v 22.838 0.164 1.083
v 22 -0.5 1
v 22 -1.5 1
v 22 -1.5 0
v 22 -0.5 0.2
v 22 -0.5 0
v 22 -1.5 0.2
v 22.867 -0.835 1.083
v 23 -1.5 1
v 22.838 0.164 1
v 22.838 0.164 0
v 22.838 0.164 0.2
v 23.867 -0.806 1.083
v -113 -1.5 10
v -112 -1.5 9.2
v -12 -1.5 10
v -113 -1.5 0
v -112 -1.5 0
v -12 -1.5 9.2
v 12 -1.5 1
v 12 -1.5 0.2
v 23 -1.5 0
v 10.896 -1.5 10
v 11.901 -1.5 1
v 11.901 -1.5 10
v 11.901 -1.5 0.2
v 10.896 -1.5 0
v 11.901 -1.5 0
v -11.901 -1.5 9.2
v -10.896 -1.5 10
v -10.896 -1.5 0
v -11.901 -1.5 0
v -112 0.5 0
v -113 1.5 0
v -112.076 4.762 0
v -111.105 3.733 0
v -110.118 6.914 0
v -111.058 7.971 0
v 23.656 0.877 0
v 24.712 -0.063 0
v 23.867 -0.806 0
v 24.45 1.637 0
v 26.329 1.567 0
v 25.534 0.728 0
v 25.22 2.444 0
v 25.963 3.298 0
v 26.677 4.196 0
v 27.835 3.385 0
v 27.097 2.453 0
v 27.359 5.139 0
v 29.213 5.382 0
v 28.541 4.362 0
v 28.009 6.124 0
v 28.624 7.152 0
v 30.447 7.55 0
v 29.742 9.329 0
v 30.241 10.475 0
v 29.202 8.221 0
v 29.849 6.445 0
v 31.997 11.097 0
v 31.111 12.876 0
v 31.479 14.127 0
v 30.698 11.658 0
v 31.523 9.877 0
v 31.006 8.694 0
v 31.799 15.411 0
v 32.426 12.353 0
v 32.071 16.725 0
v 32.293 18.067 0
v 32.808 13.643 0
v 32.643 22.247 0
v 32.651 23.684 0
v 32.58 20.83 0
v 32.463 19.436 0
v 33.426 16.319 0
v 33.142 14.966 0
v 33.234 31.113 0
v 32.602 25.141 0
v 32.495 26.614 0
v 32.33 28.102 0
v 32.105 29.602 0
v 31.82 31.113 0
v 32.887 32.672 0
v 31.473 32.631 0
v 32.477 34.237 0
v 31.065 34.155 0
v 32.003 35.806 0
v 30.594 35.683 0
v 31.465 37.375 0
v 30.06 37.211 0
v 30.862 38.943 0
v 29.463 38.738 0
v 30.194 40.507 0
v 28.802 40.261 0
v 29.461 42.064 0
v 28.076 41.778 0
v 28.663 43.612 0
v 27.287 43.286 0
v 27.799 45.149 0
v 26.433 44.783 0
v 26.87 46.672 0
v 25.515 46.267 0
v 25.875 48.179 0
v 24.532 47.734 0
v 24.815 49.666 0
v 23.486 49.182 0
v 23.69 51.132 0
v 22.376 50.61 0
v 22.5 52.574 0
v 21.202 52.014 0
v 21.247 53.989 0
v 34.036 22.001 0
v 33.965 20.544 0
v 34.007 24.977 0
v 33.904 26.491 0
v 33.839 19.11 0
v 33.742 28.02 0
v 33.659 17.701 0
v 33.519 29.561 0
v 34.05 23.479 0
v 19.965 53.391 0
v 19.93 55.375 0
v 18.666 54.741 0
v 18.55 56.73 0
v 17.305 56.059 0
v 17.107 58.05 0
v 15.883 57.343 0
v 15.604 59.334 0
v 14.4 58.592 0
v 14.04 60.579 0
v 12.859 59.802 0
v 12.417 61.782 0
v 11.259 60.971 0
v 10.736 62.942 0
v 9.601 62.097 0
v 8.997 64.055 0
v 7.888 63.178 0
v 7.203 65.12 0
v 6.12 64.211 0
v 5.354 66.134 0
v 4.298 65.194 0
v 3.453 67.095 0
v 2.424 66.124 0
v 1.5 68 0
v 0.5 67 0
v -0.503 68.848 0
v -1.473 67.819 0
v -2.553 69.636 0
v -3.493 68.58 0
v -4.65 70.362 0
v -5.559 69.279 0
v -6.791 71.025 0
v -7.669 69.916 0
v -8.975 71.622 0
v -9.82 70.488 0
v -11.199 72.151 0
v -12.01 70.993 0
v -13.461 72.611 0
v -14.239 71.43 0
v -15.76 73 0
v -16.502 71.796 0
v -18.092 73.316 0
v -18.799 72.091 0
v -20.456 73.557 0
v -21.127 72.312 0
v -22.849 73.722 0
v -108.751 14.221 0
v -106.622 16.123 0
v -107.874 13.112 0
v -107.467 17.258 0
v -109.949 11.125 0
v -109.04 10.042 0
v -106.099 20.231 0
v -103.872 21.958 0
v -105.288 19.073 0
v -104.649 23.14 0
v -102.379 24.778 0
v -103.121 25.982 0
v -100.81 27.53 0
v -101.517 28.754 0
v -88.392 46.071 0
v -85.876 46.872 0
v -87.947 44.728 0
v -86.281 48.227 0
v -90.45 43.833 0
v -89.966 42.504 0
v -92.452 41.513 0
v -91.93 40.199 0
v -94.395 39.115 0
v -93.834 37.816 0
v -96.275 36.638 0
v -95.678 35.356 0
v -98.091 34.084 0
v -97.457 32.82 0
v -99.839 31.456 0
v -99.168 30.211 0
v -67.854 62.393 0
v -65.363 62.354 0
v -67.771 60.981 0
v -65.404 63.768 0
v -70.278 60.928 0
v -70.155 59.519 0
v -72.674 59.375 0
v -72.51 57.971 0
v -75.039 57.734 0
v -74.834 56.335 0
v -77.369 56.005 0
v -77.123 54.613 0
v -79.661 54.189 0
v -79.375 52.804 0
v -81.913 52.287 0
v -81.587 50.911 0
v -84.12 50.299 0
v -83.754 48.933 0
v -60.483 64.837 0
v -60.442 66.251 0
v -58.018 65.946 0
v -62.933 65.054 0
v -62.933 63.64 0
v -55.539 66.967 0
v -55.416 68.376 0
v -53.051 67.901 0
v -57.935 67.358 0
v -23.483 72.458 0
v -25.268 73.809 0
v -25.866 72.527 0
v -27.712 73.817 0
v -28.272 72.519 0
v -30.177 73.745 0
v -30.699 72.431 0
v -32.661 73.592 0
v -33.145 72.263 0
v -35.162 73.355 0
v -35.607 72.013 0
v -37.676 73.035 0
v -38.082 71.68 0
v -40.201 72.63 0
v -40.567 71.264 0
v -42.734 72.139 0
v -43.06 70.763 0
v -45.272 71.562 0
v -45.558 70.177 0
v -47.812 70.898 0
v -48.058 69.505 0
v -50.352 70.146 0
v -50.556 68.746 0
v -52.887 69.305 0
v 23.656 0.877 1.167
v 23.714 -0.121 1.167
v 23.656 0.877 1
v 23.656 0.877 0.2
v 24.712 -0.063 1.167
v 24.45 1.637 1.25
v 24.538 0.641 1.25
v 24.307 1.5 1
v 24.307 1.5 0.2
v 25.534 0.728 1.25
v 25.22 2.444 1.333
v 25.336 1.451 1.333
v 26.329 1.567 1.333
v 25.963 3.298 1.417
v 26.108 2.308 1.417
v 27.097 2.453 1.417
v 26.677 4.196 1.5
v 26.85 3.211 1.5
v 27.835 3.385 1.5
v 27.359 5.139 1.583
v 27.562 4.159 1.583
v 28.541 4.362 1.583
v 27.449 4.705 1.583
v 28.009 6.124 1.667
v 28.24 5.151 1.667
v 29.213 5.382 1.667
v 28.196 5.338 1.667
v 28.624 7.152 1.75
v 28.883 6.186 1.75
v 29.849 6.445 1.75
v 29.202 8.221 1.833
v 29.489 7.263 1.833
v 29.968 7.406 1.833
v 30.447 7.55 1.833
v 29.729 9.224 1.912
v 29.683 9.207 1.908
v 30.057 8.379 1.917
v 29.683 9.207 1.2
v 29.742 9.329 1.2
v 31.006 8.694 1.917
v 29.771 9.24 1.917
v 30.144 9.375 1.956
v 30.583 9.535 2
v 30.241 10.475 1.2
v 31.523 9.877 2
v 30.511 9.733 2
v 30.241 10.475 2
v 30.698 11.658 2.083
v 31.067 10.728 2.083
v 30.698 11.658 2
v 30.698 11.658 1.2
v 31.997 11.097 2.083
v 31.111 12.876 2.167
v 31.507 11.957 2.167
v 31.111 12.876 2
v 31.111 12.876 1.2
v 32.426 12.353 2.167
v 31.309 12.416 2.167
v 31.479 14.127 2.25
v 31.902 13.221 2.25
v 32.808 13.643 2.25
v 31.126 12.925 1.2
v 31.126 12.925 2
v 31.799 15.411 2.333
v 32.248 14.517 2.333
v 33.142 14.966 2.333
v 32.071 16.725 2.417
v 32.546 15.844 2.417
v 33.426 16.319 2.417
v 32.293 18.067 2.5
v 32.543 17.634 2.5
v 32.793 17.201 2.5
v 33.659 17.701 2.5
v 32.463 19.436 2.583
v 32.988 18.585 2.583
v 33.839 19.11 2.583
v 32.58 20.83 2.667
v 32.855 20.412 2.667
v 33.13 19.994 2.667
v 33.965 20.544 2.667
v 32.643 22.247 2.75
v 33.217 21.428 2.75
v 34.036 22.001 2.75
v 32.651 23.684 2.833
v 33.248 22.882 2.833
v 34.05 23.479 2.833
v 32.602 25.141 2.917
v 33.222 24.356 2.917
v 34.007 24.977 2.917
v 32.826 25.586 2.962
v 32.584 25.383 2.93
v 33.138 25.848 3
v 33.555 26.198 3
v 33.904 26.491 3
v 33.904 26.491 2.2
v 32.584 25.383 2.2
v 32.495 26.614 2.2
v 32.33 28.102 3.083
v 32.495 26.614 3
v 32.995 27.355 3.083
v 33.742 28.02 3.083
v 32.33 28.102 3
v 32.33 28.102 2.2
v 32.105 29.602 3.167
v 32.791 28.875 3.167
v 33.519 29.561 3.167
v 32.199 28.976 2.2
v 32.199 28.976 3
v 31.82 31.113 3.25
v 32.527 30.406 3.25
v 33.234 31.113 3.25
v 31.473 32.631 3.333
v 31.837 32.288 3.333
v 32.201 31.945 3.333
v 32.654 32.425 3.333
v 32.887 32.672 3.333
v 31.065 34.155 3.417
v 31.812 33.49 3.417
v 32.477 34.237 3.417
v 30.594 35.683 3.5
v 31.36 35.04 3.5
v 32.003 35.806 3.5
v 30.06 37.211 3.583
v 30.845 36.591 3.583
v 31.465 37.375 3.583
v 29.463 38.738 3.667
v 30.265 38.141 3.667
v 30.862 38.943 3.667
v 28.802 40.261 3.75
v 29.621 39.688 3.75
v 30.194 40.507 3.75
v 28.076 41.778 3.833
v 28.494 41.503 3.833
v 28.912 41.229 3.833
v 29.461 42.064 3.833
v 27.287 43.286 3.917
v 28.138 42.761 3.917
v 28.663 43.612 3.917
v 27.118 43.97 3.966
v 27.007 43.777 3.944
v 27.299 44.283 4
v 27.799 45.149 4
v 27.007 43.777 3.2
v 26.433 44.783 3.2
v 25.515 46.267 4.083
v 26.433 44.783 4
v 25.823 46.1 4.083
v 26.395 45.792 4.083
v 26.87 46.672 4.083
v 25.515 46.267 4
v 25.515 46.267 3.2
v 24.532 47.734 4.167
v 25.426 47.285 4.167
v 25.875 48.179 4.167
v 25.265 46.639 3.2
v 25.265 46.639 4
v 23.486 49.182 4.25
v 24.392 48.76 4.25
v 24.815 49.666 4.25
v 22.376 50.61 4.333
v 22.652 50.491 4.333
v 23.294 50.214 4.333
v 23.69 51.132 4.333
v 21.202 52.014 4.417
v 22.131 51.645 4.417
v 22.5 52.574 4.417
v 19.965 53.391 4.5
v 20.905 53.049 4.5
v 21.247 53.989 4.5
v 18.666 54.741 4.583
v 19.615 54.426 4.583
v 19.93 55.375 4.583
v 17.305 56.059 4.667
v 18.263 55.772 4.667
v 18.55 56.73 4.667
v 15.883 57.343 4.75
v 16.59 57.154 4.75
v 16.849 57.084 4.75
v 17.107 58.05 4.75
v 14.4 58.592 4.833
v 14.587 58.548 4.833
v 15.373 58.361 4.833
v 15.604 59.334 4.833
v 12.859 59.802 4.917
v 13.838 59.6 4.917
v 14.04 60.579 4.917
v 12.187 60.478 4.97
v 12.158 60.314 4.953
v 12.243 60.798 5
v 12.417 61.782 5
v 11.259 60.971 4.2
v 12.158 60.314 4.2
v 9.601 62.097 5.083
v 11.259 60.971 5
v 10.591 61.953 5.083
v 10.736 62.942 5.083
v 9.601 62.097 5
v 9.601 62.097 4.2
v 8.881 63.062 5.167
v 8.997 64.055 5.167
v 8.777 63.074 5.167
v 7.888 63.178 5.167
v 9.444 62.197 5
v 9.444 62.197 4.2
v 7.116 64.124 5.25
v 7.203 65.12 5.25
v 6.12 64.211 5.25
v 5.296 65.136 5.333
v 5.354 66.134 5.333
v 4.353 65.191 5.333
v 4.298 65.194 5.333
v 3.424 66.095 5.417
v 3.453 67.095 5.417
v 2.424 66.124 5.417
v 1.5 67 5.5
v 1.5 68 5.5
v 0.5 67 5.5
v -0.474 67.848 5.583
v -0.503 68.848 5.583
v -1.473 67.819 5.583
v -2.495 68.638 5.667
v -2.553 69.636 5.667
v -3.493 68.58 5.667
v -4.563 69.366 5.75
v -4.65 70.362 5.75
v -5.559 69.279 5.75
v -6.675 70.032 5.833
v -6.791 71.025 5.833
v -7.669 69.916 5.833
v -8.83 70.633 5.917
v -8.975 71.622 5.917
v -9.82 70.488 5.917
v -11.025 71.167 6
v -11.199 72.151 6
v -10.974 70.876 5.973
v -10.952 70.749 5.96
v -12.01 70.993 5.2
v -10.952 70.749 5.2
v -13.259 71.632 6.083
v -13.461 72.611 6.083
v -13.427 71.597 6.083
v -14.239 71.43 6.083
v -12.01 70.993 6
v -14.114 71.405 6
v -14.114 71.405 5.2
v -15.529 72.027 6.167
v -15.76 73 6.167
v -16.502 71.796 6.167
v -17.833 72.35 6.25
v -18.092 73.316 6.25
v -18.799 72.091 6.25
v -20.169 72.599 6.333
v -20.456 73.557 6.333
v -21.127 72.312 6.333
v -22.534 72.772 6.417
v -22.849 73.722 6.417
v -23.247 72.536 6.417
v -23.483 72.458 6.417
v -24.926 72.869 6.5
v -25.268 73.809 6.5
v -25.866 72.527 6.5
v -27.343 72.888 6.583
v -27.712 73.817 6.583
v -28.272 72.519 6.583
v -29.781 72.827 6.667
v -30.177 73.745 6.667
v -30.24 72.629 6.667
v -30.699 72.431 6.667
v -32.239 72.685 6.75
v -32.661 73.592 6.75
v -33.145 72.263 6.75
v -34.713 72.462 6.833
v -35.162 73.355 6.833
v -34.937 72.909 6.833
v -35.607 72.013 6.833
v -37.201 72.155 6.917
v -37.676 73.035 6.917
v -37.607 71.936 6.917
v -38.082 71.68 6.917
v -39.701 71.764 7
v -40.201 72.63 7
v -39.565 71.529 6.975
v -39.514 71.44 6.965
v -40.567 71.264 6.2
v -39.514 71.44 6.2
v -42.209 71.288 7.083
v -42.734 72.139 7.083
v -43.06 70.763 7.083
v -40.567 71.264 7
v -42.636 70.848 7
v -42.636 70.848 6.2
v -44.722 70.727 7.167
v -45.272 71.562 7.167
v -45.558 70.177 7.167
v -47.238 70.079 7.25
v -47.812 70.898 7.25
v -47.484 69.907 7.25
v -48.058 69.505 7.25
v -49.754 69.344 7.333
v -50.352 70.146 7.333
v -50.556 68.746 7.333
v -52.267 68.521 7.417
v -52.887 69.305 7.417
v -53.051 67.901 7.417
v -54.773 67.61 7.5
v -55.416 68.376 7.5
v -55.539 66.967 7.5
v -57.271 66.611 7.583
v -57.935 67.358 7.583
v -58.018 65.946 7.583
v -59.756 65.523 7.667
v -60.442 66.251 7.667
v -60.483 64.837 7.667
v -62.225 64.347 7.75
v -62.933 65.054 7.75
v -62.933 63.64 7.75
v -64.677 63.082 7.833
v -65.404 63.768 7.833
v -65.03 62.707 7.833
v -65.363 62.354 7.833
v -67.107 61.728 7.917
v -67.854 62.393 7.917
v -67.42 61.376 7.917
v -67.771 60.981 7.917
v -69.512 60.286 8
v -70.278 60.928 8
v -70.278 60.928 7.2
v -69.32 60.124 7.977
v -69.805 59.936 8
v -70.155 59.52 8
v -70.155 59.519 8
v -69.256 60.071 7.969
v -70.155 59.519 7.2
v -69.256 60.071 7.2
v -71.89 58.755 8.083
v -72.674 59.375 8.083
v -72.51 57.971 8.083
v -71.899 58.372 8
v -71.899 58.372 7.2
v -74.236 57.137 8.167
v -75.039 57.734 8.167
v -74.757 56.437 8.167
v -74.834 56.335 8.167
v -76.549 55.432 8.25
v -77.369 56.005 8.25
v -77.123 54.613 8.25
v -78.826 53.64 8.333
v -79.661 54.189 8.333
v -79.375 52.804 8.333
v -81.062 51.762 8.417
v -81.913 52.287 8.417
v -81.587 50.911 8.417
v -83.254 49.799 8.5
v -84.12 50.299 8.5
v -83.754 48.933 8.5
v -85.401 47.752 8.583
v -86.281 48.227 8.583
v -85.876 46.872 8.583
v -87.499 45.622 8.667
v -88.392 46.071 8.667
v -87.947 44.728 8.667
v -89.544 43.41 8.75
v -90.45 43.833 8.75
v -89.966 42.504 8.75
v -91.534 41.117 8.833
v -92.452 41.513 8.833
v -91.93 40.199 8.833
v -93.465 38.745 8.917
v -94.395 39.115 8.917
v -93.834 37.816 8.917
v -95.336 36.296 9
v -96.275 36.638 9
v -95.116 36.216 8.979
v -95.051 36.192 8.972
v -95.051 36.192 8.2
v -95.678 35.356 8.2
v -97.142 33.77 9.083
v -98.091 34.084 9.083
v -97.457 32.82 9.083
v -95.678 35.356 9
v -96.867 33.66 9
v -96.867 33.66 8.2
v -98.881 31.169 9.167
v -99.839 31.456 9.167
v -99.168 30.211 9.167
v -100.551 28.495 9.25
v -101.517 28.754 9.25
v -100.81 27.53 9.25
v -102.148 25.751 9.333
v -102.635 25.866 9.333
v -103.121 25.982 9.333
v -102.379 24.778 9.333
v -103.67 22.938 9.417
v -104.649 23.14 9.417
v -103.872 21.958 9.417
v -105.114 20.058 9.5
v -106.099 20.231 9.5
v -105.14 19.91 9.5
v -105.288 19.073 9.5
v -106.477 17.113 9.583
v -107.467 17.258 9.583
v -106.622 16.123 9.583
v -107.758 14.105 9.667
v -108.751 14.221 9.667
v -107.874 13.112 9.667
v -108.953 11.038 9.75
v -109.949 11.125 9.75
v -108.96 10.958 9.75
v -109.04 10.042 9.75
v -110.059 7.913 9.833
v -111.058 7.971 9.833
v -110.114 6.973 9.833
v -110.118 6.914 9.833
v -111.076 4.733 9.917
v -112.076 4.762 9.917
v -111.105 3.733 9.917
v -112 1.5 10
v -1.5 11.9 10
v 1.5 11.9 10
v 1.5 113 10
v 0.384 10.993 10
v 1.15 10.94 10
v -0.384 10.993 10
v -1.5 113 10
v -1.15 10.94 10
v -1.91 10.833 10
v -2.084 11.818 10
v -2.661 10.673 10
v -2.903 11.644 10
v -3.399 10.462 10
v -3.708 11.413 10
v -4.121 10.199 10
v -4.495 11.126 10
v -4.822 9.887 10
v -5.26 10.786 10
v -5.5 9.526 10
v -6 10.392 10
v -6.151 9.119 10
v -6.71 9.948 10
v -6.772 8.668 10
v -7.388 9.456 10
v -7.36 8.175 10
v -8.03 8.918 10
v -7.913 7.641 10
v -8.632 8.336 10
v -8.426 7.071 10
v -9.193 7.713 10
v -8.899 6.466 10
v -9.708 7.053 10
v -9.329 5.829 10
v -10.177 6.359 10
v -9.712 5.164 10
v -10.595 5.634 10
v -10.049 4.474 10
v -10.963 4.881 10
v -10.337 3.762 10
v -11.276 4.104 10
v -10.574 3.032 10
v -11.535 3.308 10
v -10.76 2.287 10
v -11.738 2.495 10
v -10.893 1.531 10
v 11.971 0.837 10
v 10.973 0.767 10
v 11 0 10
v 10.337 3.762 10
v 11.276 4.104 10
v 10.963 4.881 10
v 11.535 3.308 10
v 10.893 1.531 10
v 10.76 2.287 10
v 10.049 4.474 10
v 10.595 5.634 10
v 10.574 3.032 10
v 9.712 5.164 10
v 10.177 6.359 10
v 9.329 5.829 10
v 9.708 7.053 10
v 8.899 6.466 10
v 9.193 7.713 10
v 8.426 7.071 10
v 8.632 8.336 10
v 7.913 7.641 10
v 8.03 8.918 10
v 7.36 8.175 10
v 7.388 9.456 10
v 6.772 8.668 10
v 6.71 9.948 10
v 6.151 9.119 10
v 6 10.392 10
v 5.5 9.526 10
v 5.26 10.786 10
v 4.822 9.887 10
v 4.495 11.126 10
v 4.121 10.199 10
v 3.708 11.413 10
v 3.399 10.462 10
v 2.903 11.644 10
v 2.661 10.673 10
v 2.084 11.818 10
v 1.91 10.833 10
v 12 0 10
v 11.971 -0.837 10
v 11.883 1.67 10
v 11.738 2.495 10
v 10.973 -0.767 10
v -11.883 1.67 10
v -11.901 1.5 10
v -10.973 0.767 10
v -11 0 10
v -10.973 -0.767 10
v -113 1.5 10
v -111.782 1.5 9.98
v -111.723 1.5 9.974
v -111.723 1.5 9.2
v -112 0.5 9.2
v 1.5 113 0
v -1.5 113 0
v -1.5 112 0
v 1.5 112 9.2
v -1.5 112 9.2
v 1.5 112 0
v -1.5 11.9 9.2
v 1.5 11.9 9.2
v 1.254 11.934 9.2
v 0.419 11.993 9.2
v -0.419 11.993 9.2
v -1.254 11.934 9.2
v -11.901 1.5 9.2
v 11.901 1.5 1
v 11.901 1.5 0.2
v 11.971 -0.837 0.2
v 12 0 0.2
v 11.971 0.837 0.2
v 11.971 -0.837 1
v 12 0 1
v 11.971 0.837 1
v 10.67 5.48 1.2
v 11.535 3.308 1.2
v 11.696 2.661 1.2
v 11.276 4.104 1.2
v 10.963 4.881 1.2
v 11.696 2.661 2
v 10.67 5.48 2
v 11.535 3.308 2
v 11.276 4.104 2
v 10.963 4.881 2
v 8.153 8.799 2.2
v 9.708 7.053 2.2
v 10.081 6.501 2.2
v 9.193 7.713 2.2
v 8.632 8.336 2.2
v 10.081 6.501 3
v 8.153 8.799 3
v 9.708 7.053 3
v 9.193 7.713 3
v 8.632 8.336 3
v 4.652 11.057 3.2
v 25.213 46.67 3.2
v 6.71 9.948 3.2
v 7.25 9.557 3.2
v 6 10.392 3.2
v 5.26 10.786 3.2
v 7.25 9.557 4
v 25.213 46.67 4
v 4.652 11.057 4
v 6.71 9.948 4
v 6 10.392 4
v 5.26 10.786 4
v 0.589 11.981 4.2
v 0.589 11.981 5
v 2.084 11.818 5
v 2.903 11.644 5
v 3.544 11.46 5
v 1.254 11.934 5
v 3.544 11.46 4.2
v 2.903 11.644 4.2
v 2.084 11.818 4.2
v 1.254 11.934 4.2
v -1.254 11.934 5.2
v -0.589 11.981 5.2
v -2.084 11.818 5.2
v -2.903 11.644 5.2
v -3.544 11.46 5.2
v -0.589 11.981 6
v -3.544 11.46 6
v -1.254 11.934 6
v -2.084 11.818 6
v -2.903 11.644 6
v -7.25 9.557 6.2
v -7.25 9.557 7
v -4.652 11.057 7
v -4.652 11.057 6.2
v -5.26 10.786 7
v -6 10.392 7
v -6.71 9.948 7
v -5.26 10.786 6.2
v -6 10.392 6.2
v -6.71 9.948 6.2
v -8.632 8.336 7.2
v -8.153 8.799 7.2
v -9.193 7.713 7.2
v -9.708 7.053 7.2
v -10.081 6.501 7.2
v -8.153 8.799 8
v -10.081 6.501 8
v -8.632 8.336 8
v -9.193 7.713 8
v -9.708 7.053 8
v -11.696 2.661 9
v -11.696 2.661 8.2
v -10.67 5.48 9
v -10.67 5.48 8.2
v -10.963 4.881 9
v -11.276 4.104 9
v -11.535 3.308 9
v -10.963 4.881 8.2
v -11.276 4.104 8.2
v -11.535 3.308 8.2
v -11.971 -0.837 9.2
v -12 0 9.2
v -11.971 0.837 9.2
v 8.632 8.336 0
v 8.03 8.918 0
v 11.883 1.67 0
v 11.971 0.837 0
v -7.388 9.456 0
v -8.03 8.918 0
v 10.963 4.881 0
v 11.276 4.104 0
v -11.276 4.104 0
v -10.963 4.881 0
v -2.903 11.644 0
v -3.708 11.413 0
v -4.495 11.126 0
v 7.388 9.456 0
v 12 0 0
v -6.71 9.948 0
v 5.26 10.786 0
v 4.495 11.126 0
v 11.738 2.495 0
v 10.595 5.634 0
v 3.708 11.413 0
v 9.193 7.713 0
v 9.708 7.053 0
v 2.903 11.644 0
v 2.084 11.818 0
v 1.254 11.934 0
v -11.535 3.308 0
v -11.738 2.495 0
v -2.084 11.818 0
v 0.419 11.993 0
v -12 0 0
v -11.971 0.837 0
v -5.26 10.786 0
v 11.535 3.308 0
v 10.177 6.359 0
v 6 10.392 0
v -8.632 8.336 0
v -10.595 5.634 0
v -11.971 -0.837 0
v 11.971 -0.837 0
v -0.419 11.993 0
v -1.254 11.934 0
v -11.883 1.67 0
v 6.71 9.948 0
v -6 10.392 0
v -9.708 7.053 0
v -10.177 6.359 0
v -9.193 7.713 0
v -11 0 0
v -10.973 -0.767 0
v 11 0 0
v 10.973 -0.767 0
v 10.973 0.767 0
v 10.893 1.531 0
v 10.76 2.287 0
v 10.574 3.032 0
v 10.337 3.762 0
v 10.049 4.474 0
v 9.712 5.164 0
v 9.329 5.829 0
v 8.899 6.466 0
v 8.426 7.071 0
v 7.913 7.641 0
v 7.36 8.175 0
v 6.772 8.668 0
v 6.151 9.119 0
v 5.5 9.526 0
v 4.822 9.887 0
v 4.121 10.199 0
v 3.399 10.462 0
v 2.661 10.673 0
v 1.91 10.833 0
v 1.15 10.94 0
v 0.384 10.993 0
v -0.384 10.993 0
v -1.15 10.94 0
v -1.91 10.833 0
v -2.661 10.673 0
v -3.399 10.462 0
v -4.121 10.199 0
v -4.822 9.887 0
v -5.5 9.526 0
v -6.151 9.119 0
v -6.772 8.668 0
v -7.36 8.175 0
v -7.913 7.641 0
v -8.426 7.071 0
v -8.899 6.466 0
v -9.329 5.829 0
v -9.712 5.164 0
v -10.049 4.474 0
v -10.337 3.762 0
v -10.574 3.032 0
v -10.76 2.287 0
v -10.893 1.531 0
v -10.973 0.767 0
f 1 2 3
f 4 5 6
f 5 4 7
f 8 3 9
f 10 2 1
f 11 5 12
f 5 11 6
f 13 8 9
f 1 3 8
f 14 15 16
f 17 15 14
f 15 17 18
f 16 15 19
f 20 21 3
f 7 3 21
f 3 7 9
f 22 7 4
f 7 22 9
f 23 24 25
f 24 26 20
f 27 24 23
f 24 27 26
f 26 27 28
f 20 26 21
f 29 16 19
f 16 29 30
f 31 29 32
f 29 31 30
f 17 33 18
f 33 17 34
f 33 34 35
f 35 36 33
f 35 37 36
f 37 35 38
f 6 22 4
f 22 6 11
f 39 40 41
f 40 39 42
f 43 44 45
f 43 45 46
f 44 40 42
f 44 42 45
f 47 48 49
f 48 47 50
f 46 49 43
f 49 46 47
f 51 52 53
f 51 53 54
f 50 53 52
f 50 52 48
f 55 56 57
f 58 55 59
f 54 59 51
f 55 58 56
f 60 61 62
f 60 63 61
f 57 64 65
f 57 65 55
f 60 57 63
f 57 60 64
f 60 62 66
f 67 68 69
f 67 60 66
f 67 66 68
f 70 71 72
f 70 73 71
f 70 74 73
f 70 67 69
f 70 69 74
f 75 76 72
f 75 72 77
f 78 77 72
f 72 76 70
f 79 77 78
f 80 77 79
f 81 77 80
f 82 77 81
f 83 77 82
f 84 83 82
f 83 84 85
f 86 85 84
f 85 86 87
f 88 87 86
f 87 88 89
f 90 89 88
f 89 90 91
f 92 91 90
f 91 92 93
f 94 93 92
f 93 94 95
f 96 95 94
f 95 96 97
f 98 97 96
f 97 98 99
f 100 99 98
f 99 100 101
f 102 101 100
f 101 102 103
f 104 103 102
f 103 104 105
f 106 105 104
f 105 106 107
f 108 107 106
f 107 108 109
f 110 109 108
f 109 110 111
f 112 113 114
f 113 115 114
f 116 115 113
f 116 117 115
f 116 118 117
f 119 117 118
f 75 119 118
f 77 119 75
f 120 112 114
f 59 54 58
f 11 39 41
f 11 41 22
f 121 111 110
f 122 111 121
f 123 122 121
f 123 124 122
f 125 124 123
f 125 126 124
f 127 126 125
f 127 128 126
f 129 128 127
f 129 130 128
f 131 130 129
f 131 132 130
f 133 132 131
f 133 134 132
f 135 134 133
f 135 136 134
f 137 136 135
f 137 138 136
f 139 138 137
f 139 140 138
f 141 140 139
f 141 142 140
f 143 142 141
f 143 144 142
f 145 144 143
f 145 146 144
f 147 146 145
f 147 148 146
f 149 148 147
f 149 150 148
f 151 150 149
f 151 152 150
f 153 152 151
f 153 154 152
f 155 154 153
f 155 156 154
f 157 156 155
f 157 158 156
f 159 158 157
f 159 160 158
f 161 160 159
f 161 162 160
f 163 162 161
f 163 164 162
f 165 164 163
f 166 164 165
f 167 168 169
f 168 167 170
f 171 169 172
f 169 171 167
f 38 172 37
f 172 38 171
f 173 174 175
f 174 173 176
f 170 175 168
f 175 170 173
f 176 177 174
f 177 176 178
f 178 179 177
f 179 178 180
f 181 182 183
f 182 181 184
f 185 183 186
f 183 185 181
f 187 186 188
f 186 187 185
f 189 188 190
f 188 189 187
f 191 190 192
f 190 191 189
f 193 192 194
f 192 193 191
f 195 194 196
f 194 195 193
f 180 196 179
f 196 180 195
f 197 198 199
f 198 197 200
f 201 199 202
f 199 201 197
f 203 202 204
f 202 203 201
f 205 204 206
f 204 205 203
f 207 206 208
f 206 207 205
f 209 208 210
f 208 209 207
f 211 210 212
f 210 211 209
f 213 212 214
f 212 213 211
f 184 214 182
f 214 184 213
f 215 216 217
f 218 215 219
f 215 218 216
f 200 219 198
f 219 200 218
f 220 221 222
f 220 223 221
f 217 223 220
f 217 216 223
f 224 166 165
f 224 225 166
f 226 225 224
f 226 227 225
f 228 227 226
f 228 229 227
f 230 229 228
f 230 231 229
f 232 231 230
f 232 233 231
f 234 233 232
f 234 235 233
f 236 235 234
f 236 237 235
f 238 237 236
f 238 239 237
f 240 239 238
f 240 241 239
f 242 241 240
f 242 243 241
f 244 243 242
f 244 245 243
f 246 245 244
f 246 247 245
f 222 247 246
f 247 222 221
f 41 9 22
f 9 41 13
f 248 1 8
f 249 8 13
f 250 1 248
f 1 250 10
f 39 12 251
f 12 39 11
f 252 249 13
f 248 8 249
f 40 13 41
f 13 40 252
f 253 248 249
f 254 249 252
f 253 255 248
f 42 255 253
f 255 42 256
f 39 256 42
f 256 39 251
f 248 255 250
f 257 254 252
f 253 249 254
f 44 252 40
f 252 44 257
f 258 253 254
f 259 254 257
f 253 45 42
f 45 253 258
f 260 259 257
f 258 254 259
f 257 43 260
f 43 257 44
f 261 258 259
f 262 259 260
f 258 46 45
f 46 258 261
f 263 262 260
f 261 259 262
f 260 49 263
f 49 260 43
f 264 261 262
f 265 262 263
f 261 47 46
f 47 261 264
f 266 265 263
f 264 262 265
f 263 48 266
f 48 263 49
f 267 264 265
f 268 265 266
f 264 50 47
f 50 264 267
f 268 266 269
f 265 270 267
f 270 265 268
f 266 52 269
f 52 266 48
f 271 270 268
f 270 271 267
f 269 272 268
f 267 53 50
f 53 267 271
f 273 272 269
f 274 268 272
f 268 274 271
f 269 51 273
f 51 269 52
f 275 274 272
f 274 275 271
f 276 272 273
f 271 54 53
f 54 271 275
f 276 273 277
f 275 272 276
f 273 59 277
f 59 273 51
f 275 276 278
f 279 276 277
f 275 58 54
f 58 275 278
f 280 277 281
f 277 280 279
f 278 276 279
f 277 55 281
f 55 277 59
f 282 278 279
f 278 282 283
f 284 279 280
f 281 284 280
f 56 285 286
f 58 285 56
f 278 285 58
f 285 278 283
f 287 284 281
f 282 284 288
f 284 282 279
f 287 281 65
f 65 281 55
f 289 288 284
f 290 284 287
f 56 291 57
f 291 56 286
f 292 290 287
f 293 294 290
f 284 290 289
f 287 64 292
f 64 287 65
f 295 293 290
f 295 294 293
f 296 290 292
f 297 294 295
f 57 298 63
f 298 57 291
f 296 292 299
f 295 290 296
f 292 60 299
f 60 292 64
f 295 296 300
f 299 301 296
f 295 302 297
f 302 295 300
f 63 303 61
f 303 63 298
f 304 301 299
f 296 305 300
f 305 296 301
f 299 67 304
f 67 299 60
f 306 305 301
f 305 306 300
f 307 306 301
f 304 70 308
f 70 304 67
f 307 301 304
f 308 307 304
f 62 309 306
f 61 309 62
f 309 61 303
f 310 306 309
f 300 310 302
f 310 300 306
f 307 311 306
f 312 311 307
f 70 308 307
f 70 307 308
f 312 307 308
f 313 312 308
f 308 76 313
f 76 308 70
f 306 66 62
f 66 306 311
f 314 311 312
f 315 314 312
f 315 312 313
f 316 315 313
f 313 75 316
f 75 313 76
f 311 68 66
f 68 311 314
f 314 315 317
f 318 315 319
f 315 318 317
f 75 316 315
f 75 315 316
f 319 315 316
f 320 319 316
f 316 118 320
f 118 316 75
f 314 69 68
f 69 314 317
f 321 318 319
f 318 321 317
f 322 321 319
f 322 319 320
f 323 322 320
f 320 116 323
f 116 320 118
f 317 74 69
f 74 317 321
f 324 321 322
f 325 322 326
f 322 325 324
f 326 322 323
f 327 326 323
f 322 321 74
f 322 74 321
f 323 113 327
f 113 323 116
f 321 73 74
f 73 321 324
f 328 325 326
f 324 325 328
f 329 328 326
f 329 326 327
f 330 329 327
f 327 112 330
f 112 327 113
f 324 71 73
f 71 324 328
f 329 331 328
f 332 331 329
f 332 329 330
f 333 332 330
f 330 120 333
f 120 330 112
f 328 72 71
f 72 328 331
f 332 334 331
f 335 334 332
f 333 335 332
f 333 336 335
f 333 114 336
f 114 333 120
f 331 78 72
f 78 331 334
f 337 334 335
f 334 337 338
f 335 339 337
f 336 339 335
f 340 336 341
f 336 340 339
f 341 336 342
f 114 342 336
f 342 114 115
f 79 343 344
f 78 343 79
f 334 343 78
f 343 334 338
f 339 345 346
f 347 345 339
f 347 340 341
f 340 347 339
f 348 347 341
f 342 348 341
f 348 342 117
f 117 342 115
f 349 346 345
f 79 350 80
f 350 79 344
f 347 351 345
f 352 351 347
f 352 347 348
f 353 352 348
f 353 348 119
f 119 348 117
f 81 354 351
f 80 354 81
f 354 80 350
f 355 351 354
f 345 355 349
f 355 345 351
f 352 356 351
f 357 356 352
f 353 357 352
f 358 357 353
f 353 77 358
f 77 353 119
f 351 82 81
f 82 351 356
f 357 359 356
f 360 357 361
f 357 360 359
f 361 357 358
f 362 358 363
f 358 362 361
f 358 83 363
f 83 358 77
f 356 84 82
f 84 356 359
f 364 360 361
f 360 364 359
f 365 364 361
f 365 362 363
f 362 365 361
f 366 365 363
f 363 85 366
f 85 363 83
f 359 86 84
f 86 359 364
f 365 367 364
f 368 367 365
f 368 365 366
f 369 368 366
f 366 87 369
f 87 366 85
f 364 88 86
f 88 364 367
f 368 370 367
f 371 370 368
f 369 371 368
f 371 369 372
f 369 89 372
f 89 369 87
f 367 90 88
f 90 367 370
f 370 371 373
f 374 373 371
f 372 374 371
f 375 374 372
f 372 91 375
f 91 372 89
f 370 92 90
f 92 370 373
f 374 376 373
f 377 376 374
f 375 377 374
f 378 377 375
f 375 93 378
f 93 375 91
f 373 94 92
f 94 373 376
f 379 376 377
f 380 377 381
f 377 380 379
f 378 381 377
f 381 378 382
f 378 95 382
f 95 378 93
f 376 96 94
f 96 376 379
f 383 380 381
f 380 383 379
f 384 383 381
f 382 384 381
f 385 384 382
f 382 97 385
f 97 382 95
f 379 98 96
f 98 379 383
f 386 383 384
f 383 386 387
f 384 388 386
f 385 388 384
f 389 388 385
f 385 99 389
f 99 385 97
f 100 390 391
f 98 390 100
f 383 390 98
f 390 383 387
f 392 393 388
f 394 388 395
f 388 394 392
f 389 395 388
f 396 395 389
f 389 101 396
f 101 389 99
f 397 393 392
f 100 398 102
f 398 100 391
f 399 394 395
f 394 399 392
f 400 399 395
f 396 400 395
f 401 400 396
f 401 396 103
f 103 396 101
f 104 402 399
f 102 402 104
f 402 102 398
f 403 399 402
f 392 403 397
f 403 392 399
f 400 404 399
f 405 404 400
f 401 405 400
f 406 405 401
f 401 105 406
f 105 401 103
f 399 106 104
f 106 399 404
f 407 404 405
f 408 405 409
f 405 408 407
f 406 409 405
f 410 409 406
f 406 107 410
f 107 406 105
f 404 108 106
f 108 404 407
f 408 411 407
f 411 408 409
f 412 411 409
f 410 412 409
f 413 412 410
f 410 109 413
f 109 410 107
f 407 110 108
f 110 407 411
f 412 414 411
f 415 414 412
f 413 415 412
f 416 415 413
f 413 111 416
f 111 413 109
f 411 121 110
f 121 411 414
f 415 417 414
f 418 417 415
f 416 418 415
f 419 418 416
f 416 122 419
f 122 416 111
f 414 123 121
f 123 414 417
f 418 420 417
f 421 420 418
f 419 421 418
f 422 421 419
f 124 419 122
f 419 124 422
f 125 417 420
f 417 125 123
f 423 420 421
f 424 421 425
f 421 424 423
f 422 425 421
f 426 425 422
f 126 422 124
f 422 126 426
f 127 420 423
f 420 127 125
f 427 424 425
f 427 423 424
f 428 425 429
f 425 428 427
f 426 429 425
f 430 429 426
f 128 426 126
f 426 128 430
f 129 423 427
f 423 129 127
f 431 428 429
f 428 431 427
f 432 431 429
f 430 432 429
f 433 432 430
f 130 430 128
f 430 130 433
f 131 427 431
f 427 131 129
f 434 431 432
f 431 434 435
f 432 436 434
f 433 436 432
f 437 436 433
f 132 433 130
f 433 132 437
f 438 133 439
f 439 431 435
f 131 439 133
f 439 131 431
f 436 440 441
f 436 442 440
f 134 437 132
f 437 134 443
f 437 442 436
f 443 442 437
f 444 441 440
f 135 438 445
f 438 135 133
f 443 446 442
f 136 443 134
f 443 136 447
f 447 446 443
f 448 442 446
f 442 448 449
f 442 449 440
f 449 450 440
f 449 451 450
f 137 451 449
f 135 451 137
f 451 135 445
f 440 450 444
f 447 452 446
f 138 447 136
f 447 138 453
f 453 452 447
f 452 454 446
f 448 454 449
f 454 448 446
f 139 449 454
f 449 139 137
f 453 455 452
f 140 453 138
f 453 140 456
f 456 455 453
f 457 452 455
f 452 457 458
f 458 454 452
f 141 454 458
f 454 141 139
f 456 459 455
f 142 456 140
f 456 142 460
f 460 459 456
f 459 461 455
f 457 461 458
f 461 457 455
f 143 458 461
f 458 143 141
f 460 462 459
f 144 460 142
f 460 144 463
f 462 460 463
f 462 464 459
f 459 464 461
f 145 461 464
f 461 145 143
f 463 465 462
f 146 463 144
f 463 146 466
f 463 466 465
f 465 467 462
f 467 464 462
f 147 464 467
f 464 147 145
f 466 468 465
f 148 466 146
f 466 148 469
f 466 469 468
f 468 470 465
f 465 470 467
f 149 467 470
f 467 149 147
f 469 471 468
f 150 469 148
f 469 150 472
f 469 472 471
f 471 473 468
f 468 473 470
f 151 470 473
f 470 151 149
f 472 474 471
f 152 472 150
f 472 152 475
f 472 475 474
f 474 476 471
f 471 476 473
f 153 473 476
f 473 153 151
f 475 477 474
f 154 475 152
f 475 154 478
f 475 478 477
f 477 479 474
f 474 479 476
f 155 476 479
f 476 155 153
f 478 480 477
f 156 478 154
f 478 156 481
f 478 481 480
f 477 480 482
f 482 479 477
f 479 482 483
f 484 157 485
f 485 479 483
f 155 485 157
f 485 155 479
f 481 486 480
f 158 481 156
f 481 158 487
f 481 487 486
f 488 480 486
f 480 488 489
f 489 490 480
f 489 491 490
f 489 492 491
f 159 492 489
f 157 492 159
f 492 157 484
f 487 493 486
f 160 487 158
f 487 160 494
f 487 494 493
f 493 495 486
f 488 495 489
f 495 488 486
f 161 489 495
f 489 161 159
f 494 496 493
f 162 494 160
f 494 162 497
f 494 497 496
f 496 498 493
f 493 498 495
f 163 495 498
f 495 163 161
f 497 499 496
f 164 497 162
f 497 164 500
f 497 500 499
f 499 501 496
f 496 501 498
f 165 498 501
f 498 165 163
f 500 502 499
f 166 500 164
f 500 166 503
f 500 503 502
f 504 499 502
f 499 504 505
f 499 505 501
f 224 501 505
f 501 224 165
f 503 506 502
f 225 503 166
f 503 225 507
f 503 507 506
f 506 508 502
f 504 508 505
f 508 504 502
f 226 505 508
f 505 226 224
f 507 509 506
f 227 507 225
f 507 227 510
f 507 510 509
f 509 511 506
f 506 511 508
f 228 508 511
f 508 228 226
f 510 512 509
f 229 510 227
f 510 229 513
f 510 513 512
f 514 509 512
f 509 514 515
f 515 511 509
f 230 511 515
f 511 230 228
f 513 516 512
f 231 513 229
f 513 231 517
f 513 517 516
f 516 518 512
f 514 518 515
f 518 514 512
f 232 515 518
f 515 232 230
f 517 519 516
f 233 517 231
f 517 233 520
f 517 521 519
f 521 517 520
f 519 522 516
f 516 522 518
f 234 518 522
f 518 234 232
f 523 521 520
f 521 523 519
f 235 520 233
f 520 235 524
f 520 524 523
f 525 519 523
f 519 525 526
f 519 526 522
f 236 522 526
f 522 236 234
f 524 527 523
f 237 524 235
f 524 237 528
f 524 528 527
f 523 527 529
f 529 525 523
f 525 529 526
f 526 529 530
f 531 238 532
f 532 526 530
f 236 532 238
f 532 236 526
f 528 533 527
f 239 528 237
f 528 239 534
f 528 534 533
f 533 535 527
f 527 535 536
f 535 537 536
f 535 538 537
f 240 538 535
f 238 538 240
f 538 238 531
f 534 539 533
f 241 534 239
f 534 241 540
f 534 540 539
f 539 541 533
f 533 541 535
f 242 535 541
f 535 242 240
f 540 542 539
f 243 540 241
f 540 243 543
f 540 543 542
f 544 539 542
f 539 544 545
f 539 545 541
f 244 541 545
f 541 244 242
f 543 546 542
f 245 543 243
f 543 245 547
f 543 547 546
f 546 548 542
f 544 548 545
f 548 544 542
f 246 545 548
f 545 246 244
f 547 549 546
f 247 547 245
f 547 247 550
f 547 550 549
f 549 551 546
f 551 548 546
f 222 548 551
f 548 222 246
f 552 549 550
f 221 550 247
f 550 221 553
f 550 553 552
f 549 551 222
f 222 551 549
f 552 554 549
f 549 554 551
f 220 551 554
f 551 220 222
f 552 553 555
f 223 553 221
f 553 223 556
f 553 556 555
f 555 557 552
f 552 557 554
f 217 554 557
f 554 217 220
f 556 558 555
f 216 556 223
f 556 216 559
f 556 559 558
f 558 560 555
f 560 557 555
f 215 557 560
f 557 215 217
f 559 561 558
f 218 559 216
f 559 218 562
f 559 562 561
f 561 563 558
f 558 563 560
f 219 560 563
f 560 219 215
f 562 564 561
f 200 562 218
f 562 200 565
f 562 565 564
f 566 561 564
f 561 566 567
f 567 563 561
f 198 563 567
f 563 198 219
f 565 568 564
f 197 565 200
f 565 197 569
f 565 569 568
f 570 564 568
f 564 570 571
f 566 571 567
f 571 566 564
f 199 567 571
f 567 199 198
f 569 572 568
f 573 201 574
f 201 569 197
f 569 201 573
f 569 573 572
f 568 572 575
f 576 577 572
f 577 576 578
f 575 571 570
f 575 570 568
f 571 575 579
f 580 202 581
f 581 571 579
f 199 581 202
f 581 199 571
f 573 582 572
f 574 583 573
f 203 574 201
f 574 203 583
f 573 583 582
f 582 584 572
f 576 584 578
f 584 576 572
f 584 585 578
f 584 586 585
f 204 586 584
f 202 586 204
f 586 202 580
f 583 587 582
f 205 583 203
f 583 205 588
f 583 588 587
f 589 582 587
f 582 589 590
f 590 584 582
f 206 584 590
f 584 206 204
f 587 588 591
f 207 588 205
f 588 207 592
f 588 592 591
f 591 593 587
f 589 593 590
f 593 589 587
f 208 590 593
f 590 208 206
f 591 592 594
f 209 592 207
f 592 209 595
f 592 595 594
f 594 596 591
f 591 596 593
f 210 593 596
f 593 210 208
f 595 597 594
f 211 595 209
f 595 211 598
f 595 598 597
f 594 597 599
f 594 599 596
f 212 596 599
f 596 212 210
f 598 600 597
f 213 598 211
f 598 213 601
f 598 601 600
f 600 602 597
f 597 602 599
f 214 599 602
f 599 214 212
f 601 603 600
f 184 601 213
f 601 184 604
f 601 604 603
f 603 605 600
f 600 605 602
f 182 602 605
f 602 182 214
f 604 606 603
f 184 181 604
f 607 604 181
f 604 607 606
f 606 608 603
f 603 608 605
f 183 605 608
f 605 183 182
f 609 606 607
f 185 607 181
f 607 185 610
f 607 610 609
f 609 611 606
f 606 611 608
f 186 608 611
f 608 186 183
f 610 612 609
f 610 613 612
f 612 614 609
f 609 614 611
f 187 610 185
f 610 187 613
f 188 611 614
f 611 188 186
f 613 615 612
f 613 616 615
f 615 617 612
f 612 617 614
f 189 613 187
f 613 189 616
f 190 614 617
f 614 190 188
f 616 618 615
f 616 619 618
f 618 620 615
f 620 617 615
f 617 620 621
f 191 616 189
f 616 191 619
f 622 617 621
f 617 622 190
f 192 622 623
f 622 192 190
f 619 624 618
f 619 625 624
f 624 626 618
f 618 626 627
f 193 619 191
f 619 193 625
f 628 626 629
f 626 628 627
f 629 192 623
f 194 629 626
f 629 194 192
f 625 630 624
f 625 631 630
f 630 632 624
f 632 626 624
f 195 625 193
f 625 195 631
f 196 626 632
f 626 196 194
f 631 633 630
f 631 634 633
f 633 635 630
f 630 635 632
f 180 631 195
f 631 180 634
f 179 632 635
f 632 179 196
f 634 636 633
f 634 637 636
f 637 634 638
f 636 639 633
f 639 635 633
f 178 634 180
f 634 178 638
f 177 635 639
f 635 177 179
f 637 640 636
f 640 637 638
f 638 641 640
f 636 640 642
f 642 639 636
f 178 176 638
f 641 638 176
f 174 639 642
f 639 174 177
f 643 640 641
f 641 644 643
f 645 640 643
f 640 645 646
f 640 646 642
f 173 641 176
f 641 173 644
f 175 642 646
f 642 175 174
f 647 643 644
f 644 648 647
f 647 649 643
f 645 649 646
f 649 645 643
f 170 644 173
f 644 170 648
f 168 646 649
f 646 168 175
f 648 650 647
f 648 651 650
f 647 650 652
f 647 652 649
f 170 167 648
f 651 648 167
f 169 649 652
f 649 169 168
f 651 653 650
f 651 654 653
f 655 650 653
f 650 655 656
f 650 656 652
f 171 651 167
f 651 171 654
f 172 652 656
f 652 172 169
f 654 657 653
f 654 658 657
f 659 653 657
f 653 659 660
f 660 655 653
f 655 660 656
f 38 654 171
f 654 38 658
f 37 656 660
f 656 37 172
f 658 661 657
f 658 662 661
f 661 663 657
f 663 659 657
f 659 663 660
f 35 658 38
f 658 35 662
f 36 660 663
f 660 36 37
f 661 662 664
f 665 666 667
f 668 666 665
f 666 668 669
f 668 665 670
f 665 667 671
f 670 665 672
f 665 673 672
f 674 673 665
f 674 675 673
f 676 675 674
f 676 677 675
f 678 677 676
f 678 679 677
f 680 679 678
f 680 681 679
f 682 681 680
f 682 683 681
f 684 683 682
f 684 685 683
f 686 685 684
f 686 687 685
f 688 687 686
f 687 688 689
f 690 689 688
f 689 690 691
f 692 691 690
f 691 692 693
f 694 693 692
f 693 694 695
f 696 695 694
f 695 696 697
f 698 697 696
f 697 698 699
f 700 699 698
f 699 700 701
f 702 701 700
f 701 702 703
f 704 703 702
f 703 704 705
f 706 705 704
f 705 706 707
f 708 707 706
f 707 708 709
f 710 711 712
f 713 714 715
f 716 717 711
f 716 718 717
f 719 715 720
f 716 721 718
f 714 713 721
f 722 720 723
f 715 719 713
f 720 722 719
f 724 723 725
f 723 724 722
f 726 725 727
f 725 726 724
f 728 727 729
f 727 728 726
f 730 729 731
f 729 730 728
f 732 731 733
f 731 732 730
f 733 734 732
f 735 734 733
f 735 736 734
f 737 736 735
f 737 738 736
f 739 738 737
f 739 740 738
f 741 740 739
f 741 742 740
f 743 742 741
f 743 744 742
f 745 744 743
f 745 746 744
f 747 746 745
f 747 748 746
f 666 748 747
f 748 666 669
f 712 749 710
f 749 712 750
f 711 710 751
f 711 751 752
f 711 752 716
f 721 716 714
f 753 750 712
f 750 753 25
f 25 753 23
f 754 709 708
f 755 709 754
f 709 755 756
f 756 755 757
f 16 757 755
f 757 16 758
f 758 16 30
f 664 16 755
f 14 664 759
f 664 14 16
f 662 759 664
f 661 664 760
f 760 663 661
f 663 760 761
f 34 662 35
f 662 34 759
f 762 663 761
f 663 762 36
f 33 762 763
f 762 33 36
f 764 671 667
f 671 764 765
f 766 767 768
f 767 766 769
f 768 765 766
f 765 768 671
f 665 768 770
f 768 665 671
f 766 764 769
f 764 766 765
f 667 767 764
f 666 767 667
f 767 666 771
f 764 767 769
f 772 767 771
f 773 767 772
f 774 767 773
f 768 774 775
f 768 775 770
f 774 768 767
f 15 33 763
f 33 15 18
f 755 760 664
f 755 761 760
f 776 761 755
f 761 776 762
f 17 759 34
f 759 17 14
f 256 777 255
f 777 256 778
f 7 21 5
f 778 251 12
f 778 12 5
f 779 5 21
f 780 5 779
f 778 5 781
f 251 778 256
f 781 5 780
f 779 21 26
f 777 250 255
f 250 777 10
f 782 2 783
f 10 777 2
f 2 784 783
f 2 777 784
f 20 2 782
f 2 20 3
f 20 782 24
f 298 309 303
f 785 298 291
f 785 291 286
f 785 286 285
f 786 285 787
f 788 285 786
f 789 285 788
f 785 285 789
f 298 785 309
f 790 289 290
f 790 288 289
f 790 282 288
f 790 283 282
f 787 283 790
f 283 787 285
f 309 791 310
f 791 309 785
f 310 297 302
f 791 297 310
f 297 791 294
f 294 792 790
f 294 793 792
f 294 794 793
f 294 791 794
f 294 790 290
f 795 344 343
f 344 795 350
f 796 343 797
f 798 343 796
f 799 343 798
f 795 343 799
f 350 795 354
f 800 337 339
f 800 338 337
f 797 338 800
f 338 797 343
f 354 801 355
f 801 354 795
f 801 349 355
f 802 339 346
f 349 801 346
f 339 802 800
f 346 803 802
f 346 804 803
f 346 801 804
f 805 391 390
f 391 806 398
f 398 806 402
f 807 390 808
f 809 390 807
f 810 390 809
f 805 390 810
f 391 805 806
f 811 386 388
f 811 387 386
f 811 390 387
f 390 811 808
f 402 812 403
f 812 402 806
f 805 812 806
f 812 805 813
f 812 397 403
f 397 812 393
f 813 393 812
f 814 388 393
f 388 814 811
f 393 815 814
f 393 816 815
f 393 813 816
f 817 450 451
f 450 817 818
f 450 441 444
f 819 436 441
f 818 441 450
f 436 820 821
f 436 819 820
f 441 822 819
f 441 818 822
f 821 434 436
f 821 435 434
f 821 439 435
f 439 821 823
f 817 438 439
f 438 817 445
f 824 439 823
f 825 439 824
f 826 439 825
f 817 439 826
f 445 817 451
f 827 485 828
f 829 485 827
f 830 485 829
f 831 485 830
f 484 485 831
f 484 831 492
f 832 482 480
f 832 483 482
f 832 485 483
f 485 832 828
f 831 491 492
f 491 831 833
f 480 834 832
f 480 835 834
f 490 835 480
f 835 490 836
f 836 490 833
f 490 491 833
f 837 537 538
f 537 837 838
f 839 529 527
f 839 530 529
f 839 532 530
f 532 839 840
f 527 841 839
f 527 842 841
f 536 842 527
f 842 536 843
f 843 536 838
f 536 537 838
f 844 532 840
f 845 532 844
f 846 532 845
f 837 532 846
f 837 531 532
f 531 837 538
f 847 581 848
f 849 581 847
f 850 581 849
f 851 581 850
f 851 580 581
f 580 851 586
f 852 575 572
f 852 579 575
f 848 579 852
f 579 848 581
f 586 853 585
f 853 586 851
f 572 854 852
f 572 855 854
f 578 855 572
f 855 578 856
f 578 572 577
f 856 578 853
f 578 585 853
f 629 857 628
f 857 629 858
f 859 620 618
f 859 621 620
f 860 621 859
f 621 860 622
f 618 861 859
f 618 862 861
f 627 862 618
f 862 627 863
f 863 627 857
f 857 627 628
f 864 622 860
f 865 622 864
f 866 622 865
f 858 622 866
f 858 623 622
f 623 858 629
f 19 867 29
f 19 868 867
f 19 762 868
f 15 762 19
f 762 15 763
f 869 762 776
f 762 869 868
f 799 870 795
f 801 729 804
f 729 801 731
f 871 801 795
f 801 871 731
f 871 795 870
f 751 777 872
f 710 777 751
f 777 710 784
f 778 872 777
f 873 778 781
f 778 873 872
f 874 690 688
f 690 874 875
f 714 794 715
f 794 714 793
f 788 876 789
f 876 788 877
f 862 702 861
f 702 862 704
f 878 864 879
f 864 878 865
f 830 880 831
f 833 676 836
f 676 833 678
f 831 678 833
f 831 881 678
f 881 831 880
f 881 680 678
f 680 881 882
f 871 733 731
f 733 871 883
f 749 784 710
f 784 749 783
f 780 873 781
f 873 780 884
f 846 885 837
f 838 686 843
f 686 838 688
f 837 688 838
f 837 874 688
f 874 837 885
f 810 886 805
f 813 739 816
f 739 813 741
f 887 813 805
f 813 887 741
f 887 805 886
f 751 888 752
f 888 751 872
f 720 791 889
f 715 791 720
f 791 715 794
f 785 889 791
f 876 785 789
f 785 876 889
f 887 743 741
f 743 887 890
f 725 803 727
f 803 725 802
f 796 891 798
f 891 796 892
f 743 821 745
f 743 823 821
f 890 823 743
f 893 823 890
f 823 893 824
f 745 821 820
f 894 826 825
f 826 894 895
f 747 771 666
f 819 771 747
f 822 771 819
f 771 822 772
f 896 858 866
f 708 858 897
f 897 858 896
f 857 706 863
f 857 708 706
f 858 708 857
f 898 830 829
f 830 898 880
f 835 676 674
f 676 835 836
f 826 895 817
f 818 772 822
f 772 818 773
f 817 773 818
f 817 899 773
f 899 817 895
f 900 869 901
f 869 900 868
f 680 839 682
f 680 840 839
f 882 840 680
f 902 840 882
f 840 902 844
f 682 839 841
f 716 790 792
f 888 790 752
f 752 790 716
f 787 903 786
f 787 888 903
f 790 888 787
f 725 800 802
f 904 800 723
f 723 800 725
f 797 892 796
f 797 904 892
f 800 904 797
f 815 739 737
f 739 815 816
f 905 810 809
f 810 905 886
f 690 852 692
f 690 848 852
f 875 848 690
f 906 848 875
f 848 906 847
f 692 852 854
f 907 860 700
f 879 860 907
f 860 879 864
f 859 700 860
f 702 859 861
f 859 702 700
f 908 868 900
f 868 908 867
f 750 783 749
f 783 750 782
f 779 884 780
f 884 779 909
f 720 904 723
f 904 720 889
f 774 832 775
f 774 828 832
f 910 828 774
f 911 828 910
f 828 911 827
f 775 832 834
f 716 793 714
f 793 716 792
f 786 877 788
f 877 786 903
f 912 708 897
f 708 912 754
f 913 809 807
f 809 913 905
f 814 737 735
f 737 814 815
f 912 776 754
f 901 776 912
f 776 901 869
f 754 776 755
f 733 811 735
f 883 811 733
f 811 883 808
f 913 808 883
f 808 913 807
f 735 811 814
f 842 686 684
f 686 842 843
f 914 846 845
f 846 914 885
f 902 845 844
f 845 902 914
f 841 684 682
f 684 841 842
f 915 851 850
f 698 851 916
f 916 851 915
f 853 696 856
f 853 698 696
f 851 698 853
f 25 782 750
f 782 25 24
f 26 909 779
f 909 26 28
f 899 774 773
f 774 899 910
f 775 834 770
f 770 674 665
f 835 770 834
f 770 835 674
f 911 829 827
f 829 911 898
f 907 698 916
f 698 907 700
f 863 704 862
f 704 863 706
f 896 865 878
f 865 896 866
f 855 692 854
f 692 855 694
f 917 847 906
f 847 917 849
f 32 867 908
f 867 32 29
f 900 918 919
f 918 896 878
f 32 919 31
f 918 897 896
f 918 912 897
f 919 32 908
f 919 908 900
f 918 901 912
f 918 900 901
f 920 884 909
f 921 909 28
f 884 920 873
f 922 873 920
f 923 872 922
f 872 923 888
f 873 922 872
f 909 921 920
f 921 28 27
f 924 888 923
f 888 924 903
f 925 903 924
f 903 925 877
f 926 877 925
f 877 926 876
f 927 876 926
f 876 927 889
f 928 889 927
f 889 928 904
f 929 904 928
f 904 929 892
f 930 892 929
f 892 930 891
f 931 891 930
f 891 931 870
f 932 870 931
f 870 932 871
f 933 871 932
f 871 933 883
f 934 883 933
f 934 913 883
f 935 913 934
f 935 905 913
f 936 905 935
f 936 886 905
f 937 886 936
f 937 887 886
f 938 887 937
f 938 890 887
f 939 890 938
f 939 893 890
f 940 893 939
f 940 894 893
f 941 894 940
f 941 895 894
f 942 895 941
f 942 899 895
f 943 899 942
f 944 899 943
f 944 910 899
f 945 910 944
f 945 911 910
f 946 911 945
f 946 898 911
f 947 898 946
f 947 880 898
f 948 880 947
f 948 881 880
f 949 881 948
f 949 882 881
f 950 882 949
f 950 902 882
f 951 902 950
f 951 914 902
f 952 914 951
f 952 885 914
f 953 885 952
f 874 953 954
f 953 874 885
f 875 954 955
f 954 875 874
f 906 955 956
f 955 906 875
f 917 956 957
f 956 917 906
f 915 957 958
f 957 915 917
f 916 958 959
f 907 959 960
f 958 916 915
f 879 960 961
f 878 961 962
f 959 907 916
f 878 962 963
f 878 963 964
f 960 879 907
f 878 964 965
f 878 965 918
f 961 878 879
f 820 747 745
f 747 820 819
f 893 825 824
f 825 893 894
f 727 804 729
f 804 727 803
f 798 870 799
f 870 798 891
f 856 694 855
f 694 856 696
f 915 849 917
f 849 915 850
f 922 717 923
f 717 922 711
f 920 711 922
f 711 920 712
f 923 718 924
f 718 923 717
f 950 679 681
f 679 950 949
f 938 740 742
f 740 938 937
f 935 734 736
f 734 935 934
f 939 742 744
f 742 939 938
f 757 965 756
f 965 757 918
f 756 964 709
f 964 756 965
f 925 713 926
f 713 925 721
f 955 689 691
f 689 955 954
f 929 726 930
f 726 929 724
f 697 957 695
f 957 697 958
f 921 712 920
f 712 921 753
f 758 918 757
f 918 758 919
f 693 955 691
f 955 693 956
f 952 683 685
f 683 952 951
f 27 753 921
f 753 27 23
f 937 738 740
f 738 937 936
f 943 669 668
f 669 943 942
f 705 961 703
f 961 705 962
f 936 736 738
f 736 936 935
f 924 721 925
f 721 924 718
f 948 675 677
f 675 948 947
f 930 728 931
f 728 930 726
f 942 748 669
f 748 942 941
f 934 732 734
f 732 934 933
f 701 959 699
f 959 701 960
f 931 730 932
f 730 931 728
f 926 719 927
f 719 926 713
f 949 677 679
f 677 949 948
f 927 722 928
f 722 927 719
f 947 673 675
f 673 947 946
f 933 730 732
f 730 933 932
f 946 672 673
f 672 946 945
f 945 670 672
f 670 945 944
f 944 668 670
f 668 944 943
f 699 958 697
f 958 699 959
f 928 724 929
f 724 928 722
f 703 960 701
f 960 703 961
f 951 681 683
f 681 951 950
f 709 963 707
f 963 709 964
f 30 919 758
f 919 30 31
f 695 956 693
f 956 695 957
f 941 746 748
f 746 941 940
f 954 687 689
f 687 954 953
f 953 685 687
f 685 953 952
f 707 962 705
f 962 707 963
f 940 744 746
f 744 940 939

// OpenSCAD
// OpenSCAD  test object for bridges
// Also tests for on-extruder fan cooling unevenness in X,Y axes.

// Parametrised to use as much space on a print bed as required.
// this design uses only half the spiral of the original.

// Customiser enabled

// preview[view:north east, tilt:top diagonal]

/*[Bridges]*/
// length of the shortest bridge
min_bridge_length = 10; //[10:5:180]

// length of the longest bridge
max_bridge_length = 100; //[20:5:200]

// Total number
number_of_bridges = 10; //[4:1:20]

// difference between subsequent bridges
bridge_increment = (max_bridge_length - min_bridge_length) / (number_of_bridges - 1) ; //5;

// Test the XY cooling efficiency
show_XY_test = "yes"; // [yes,no]

/*[Shape]*/
// diameter of the central hub
hub_diameter = 24; //[18:1:30]

// width of each bridge
bridge_width = 3; //[1:1:8]

// thickness of the vertical walls
wall_thickness = 1; //[1:10]

// layer height of each bridge
bridge_height = 0.8; //[0.1:0.1:2]

// height of each bridge above the previous bridge
bridge_z_gap = 0.2; //[0.2:0.1:1]

/* [Hidden] */
// angle between each bridge
bridge_angle = 180.0 / (number_of_bridges -1);

spiralResolution = 12*1;
spiralIncrement = 1/spiralResolution;
maxAngle = bridge_angle * (number_of_bridges-1);
eps = 0.1 * 1; 
$fn = 90 * 1;


function spiralOffset(angle) = min_bridge_length + angle/maxAngle * (max_bridge_length - min_bridge_length);
function extensionAngle(length) = asin((bridge_width*0.5)/length);

module bridgeTest() {
	tubeHeight = number_of_bridges * (bridge_height + bridge_z_gap);
	heightStride = bridge_height + bridge_z_gap;

	difference() {
		union() {
			// Central hub
			cylinder(r = hub_diameter/2, h = tubeHeight);
			
			// The spokes (bridges)
			for (i=[0:number_of_bridges-1]) {
				length = spiralOffset(i*bridge_angle) + wall_thickness * 2;
				start_height = i * heightStride  + bridge_z_gap;
				hull() {
					rotate([0, 0, i*bridge_angle]) {
						translate([hub_diameter/2 - wall_thickness, 0, start_height]) {
							translate([0, -bridge_width/2, 0])
							cube([length , bridge_width, bridge_height], center=false);
							if (i < number_of_bridges-1) {
								translate([0, bridge_width/2 - eps, 0]) {
									cube([spiralOffset(i*bridge_angle + extensionAngle(length)) + wall_thickness, eps, bridge_height], center=false); // only an approximation
								}
							}
						}
					}
				}
				// Outer Spiral uprights
				if (i < number_of_bridges-1) {
					for (f=[0 : spiralResolution-1]) {
						frac  = f / spiralResolution;
						top	  = start_height + bridge_height;
						//end	= i == number_of_bridges-1 && f == spiralResolution-1;
						angle = i*bridge_angle + bridge_angle * f / spiralResolution;
						hull()  { // This hull sweeps through all the supports making a nice spiral
							rotate([0, 0, angle]) {
								translate([hub_diameter/2 + spiralOffset(angle), -bridge_width/2, 0]) {
									cube([wall_thickness, wall_thickness, top + heightStride * frac], center=false);
								}
								rotate([0, 0, bridge_angle * spiralIncrement])
								translate([hub_diameter/2 + spiralOffset(angle + bridge_angle * spiralIncrement),
										   -bridge_width/2, 0]) {
									cube([wall_thickness, wall_thickness, top + heightStride * (frac + spiralIncrement)], center=false); 
								}
							}
						}
					}
				} else { // last upright of outer spiral
					rotate([0, 0, i*bridge_angle]) {
						translate([length + hub_diameter/2 - wall_thickness*2, -bridge_width/2, 0]) {
							cube([wall_thickness, bridge_width, start_height + heightStride-bridge_z_gap], center=false);
						}
					}
					if (show_XY_test == "yes") {
						// extra leg
						rotate([0, 0, i*bridge_angle -90]) {
							translate([length + hub_diameter/2 - wall_thickness*2, -bridge_width/2, 0]) {
								cube([wall_thickness, bridge_width, start_height + heightStride-bridge_z_gap], center=false);
							}
						}
						// extra bridge
						rotate([0, 0, i*bridge_angle - 90]) {
							translate([hub_diameter/2 - wall_thickness, 0, start_height]) {
								translate([0, -bridge_width/2, 0])
								cube([length , bridge_width, bridge_height], center=false);
							}
						}
					}
				}
			}
		}
		// core out the cylinder and remove the un-needed side
		cylinder(r=hub_diameter/2 - wall_thickness, h=tubeHeight*3, center=true);
		translate([-hub_diameter/2, -hub_diameter-bridge_width/2, -1]) {
			cube([hub_diameter, hub_diameter, tubeHeight+2], center=false);
		}
	}

}

bridgeTest();
